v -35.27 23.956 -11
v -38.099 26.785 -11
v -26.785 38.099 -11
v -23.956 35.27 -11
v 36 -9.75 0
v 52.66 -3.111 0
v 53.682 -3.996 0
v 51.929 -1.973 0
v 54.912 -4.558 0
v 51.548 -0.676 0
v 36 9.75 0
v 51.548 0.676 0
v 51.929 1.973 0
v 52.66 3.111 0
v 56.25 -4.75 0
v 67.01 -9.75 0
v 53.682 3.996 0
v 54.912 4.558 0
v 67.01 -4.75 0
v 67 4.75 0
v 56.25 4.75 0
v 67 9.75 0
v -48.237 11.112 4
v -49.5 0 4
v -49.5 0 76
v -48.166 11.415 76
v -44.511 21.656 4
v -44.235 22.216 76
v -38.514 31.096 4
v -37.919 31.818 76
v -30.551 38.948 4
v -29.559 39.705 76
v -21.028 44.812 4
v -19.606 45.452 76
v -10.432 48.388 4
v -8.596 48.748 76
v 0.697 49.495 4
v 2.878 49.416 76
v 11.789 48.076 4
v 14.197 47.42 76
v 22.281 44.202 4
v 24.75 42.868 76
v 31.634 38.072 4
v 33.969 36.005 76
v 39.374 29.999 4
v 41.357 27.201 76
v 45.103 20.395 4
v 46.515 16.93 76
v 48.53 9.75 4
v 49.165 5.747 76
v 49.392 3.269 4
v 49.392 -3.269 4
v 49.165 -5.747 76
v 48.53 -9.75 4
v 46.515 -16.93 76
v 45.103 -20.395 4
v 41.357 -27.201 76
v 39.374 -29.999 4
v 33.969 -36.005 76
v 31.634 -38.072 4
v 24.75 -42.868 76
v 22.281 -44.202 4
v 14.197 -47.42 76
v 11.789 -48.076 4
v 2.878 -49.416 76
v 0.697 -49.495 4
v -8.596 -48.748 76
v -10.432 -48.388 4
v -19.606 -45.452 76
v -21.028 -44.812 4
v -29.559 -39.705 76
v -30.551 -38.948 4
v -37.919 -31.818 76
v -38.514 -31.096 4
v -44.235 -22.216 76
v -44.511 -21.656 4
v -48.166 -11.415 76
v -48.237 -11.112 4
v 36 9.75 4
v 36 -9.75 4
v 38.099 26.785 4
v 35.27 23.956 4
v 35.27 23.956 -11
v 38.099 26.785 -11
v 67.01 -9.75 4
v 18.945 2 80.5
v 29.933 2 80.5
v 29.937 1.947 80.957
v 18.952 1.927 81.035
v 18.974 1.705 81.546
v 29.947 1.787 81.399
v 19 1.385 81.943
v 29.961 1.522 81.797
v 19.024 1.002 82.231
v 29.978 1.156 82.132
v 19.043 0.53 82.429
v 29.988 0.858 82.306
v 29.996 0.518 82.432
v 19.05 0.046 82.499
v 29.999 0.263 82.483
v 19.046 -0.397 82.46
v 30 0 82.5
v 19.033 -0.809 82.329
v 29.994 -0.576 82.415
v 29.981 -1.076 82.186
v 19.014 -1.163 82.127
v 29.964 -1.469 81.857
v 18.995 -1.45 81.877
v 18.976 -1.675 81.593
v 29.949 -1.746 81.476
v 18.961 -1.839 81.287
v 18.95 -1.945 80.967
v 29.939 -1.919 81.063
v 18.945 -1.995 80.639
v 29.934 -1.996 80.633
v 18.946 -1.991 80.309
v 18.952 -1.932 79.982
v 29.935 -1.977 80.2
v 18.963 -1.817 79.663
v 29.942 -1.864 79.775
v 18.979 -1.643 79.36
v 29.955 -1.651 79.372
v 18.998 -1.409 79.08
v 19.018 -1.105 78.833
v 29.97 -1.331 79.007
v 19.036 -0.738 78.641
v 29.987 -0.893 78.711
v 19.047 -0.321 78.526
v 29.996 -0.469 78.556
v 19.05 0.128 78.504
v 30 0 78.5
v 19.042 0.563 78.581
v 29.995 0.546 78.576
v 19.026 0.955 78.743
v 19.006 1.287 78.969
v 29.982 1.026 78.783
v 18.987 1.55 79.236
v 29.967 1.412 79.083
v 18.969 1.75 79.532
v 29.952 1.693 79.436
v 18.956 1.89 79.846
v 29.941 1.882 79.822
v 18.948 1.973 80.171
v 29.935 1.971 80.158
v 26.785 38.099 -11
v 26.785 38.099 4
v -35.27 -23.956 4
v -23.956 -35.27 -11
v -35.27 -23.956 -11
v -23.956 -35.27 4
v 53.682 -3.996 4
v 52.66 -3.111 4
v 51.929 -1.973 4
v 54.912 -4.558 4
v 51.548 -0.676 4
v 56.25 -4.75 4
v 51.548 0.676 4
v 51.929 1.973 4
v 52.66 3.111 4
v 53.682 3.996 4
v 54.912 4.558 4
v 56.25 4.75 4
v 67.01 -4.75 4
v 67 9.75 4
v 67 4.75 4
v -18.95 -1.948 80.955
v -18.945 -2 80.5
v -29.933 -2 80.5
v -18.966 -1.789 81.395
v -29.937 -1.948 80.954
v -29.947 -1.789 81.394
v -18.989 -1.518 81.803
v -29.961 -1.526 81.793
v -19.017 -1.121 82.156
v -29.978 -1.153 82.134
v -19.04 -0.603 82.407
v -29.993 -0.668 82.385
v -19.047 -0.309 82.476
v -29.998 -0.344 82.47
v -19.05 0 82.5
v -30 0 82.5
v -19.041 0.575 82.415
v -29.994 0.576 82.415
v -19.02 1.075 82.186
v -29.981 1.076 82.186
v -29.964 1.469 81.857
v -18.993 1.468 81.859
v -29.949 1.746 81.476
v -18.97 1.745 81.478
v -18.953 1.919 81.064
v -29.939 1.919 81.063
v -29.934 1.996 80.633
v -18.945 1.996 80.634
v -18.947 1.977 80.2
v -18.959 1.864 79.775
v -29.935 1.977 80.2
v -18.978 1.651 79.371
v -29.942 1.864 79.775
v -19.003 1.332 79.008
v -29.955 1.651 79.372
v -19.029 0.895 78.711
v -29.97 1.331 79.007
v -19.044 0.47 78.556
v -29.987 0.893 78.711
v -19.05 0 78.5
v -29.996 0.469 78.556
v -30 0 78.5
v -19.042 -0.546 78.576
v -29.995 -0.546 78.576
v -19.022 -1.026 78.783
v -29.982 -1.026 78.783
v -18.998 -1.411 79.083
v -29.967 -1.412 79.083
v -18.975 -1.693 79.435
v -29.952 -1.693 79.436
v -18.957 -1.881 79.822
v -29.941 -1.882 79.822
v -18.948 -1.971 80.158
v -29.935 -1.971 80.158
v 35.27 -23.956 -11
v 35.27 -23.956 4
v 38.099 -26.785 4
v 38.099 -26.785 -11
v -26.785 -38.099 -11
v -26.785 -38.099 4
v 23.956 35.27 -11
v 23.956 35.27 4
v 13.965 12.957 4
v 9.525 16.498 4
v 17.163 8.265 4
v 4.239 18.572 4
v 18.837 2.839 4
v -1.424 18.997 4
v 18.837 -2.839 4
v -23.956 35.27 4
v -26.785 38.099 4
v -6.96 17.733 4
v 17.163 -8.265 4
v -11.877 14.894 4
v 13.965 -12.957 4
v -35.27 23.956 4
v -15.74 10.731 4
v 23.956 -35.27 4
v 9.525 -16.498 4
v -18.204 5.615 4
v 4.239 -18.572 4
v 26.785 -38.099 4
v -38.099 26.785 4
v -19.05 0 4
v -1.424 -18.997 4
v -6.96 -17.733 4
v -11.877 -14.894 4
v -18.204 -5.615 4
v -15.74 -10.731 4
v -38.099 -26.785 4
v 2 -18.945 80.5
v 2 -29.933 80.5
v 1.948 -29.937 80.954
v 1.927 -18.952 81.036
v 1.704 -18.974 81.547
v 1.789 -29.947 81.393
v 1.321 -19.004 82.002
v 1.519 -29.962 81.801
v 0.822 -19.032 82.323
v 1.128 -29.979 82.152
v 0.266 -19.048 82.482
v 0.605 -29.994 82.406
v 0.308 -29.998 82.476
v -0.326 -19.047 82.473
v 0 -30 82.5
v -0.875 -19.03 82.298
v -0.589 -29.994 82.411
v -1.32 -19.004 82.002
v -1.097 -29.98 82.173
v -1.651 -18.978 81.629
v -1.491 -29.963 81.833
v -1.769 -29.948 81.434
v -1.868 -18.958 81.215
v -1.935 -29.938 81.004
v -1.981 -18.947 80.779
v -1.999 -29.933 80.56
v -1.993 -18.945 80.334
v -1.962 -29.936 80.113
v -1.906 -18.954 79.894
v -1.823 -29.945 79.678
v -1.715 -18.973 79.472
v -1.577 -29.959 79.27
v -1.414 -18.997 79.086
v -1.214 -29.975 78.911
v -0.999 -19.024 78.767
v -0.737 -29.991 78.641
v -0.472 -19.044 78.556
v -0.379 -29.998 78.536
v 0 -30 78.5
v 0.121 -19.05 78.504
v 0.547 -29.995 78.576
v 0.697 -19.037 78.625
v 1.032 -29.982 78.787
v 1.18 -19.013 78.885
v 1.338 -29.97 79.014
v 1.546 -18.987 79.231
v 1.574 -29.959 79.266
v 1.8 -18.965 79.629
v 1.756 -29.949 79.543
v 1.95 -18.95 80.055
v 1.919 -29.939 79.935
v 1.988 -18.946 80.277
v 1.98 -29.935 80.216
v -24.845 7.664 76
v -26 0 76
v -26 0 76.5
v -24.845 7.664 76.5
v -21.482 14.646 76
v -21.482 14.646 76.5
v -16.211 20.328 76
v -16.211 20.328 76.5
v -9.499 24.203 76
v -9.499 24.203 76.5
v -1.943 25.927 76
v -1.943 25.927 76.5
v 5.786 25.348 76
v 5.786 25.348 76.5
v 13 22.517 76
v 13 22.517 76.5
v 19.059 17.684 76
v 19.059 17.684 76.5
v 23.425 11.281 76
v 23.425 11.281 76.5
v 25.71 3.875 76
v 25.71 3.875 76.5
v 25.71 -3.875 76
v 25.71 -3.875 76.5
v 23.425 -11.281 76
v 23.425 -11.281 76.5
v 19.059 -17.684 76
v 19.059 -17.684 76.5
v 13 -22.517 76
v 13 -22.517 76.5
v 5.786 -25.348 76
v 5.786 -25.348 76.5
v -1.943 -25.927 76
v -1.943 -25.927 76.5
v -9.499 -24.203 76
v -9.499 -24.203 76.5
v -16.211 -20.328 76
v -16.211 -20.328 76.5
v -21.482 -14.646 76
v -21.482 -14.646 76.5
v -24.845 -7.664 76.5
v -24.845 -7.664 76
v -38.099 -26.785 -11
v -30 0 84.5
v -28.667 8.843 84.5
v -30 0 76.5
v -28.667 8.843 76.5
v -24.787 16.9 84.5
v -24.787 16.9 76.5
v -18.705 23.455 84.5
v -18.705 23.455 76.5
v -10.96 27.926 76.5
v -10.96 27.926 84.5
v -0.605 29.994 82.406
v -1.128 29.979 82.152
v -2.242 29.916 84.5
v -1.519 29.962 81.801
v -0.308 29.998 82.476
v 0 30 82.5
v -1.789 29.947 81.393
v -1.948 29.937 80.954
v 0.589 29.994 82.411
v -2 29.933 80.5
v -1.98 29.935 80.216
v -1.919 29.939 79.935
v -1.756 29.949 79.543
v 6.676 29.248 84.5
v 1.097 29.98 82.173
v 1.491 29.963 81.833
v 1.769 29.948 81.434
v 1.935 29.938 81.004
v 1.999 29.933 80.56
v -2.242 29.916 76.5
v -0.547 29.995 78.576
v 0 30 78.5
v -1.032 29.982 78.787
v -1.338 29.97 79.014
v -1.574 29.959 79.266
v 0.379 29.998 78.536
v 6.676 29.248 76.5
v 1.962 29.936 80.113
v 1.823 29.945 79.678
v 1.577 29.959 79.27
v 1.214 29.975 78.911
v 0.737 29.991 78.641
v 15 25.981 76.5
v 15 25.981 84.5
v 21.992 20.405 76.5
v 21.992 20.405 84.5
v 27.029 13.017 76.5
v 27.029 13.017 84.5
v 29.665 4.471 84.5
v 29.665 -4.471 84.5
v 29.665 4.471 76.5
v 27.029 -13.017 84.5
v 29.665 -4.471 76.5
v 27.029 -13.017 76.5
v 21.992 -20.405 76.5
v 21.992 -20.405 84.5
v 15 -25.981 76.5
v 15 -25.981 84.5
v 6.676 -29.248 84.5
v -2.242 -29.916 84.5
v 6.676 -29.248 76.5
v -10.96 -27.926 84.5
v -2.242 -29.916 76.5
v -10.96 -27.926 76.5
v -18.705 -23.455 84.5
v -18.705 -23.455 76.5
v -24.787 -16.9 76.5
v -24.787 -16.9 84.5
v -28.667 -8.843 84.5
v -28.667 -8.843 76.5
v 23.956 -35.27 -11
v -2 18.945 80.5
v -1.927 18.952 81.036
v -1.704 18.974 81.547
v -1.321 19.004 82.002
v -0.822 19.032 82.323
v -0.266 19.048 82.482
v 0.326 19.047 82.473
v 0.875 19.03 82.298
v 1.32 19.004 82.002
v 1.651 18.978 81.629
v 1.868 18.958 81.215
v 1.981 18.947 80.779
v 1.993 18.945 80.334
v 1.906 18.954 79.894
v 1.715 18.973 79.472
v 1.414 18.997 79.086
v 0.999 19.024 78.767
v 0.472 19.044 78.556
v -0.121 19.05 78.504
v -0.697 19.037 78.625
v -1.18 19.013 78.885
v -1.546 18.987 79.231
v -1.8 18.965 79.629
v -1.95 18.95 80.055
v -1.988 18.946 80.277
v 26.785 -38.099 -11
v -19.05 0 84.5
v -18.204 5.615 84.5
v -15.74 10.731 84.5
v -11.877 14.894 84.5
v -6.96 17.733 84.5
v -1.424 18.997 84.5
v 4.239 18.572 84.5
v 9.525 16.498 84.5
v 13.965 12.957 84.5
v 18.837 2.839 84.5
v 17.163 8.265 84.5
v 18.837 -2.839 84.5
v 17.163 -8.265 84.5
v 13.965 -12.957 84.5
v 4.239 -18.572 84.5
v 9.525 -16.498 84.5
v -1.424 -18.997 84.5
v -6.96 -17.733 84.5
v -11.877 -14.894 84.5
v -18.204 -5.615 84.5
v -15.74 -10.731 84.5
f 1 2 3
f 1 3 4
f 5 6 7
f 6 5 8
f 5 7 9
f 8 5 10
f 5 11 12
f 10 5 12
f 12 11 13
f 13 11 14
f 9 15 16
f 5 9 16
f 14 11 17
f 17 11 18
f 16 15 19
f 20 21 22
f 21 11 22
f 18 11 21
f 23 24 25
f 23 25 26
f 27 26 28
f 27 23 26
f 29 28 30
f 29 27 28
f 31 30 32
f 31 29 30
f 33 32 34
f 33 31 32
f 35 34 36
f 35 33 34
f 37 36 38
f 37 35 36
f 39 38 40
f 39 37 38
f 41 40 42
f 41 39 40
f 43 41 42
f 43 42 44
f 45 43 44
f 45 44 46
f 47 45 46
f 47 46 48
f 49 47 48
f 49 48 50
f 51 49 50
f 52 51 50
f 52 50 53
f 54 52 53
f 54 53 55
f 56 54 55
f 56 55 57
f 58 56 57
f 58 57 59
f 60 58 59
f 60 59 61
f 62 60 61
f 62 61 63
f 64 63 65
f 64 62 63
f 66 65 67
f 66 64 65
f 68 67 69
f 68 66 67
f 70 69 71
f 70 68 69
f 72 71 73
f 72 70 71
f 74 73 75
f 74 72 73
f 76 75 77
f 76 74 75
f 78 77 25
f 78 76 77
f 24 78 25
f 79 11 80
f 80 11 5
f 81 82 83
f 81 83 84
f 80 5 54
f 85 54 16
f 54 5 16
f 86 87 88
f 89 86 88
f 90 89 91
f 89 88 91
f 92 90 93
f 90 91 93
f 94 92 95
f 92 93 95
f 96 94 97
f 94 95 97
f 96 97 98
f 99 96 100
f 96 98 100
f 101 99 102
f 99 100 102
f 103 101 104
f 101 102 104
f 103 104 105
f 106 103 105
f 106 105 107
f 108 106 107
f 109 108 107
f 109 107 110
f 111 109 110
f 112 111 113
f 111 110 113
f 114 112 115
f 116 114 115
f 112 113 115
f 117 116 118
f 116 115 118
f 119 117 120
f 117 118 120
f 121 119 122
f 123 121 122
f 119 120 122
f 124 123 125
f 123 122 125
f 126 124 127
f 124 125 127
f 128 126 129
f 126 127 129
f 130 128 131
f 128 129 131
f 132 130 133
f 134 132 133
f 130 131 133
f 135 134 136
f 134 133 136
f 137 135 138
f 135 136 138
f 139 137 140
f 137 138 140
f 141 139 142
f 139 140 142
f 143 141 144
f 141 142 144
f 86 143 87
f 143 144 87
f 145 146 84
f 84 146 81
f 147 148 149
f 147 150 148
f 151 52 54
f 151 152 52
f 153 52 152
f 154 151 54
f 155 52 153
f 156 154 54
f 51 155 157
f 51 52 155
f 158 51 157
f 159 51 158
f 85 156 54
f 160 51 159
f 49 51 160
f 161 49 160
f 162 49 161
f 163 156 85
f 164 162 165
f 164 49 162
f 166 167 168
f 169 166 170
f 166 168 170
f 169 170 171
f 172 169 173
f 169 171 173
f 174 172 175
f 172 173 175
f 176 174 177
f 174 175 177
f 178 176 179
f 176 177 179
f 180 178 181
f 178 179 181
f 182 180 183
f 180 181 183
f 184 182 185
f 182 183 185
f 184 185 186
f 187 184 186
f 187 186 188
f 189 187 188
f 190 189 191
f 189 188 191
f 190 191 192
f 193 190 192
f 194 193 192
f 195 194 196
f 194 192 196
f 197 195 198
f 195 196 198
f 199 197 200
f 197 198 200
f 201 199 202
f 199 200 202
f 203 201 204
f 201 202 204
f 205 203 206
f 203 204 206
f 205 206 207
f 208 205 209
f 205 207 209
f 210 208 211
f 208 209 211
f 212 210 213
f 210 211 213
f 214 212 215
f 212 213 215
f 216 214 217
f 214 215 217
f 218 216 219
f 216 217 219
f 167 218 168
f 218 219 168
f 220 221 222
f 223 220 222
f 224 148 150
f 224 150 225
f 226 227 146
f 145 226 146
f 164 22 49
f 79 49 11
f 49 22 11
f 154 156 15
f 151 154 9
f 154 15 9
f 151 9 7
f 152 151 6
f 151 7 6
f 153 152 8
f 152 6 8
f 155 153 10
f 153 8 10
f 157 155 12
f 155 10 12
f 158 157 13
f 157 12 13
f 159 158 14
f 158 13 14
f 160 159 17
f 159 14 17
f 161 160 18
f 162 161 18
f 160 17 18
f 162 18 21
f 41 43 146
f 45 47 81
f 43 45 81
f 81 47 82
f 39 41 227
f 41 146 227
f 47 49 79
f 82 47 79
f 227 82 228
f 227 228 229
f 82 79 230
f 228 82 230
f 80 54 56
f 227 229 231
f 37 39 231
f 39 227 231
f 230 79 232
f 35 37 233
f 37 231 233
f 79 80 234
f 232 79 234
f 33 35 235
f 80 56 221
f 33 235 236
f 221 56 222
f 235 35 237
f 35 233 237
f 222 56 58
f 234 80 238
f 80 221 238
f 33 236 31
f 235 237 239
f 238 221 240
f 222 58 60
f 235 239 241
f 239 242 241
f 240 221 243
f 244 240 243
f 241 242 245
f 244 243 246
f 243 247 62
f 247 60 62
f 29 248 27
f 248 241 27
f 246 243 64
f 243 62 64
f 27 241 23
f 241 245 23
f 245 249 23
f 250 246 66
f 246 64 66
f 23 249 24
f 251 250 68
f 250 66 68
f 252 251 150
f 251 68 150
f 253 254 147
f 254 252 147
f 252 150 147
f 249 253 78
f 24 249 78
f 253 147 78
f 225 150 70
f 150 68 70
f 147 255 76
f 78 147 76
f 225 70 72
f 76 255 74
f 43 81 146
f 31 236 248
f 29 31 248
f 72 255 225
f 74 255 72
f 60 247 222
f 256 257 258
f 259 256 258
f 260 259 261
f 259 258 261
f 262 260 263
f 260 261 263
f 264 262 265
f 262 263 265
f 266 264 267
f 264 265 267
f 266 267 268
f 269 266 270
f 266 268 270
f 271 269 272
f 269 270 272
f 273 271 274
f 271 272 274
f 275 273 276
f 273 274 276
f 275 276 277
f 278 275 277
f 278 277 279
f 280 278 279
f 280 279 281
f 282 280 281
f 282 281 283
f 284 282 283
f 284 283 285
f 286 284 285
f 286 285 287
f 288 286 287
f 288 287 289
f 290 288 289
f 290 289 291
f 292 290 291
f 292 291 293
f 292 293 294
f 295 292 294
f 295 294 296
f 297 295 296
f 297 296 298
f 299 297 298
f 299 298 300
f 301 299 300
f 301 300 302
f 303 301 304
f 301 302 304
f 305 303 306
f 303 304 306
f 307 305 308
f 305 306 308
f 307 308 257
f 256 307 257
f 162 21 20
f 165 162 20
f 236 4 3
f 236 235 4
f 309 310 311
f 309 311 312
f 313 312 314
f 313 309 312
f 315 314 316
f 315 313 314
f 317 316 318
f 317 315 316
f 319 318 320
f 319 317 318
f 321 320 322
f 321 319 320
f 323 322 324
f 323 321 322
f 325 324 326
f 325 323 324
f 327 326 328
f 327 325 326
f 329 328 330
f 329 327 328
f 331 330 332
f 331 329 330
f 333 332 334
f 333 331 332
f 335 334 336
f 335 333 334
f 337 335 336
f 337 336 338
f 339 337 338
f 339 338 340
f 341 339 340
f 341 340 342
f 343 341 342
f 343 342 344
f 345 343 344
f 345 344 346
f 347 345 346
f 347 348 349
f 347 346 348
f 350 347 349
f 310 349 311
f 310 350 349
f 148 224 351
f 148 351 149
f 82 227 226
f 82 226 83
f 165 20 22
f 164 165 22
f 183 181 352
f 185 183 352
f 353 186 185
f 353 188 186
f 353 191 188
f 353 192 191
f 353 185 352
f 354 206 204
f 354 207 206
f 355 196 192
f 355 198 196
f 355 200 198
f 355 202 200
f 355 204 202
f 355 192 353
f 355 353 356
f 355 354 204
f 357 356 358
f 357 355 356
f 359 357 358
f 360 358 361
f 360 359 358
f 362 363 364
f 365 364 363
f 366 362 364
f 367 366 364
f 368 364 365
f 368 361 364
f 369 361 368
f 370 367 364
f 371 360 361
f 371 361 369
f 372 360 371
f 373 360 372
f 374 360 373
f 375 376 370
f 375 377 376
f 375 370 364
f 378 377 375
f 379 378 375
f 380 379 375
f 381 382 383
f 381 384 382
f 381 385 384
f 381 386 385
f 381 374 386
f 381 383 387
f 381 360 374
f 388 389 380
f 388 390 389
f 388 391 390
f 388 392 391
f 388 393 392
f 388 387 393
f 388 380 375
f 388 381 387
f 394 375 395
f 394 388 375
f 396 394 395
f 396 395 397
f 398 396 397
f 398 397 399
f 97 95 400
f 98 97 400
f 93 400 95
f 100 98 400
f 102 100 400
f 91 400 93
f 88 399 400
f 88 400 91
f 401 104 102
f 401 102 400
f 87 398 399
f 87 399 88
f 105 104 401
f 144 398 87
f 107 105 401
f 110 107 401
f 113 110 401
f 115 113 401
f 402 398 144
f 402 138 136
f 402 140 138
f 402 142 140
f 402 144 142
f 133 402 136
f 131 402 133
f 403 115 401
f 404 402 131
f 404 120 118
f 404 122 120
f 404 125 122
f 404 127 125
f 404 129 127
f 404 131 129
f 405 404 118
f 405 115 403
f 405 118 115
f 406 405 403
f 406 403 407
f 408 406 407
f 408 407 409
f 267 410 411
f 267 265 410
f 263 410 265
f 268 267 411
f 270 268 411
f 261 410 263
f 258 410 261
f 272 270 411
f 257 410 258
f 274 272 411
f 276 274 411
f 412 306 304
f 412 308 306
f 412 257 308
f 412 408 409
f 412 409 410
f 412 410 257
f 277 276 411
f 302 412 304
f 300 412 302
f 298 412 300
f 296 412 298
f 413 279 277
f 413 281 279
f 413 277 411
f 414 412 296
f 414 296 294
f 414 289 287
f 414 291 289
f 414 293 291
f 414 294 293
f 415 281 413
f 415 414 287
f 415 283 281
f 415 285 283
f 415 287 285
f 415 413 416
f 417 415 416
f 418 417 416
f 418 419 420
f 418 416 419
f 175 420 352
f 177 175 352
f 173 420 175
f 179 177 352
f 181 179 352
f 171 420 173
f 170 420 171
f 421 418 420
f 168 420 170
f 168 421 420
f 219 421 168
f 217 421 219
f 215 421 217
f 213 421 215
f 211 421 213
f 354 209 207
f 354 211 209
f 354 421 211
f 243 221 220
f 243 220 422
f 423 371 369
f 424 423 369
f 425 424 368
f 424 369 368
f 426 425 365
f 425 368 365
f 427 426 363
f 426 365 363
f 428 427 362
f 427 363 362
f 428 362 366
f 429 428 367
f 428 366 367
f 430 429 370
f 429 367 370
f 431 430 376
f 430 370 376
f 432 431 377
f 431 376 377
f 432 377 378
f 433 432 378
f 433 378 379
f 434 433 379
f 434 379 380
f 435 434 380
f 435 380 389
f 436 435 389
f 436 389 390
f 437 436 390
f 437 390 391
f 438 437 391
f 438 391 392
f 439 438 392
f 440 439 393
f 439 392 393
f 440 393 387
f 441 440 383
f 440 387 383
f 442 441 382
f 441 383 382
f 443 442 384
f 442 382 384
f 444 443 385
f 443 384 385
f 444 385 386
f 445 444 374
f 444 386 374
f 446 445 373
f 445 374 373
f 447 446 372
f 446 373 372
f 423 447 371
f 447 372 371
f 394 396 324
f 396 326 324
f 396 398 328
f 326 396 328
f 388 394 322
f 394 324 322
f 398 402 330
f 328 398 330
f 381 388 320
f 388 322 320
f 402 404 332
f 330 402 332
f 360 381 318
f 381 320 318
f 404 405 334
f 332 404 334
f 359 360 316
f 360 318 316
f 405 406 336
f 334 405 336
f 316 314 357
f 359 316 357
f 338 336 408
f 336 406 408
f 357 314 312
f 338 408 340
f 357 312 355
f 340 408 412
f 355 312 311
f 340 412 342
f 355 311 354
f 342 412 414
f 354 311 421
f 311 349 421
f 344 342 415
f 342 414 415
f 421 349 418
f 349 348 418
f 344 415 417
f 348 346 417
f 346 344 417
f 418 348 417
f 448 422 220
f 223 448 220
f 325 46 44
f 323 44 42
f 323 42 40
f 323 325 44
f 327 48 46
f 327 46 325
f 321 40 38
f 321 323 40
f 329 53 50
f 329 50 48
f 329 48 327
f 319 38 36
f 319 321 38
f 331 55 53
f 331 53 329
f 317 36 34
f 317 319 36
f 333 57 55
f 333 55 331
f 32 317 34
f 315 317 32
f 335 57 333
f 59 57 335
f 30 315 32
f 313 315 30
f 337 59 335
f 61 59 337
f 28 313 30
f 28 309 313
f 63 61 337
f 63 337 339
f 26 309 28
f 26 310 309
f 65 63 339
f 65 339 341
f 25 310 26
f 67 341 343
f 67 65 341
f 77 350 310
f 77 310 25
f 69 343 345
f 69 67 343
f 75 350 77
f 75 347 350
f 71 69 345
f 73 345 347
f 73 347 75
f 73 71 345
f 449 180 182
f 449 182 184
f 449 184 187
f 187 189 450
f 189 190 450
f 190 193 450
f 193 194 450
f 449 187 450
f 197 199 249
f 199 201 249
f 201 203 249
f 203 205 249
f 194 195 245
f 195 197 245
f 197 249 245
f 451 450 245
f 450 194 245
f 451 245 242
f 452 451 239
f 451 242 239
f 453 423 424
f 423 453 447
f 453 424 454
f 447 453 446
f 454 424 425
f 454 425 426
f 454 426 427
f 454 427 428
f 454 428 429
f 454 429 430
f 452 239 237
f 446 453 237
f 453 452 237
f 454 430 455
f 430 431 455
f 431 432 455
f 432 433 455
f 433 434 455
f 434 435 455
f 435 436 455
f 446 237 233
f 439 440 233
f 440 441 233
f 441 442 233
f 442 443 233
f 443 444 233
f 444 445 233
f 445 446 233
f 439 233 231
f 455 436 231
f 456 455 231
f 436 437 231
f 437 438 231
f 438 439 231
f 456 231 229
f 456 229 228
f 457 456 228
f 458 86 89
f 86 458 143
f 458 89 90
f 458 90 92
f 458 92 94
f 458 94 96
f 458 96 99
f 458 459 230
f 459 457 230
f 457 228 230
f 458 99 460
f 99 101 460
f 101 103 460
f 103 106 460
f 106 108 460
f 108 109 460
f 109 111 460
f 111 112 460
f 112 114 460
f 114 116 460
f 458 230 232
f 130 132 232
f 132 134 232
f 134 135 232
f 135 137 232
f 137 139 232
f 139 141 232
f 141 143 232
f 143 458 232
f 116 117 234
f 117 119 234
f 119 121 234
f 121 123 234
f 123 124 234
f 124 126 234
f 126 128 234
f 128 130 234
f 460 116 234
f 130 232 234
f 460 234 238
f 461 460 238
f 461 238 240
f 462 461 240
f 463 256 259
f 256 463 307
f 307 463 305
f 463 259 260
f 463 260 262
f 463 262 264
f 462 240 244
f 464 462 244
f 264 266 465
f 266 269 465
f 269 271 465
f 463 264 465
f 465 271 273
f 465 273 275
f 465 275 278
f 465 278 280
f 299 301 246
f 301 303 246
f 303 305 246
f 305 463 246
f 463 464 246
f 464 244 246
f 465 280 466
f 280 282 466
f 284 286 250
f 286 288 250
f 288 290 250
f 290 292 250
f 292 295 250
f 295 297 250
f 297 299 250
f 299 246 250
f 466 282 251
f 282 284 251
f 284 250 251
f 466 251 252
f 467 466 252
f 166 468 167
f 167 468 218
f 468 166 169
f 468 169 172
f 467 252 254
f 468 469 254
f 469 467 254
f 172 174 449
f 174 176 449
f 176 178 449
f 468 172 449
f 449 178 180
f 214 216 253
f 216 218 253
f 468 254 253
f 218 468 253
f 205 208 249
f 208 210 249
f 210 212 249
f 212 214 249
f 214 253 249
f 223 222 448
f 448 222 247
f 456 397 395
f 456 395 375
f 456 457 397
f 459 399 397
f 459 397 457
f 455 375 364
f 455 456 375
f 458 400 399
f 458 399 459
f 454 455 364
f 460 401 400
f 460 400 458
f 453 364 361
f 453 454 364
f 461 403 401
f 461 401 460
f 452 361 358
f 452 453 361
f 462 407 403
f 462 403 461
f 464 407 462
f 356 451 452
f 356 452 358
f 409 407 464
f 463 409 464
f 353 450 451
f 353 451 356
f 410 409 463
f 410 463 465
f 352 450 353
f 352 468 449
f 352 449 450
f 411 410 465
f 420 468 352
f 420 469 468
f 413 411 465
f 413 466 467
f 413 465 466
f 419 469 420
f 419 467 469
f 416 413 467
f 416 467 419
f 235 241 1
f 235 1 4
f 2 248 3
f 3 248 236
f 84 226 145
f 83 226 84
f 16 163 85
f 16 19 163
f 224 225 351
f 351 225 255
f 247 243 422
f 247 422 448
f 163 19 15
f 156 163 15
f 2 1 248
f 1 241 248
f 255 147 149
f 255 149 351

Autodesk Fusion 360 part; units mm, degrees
sketch "Sketch1" plane through (0, 0, 0) normal (0, 0, 1) x (1, 0, 0)
  line L0 (36.0002, -9.75) -> (67.0101, -9.75)
  line L1 (67.0002, 9.75) -> (36.0002, 9.75)
  line L2 (67.0101, -4.75) -> (56.25, -4.75)
  arc A0 (56.25, 4.75) -> (51.5, 0) centre (56.25, 0) ccw
  line L3 (67.0101, -4.75) -> (67.0101, -9.75)
  line L4 (36.0002, 9.75) -> (36.0002, -9.75)
  arc A1 (51.5, 0) -> (56.25, -4.75) centre (56.25, 0) ccw
  line L5 (56.25, 4.75) -> (67.0002, 4.75)
  line L6 (67.0002, 4.75) -> (67.0002, 9.75)
  line L7 (0, 0) -> (36.0002, 0)
  point P0 (51.5001, 4.75)
  dimension "d7" = 4.75
  dimension "d8" = 4.75
  dimension "d9" = 4.75
  dimension "d10" = 31
  dimension "d11" = 19.5
extrude "Extrude1" add sketch "Sketch1" along normal blind 4
sketch "Sketch2" plane through (0, 0, 4) normal (0, 0, 1) x (-1, 0, 0)
  line L0 (-56.25, -4.75) -> (-67.0002, -4.75)
  line L1 (-67.0002, -4.75) -> (-67.0002, -9.75)
  line L2 (-67.0101, 9.75) -> (-67.0101, 4.75)
  line L3 (-67.0101, 4.75) -> (-56.25, 4.75)
  arc A0 (-51.5, 0) -> (-56.25, 4.75) centre (-56.25, 0) ccw
  arc A1 (-56.25, -4.75) -> (-51.5, 0) centre (-56.25, 0) ccw
  circle A2 centre (0, 0) radius 49.5
  circle A3 centre (0, 0) radius 19.05
  dimension "d14" = 99
  dimension "d15" = 38.1
extrude "Extrude2" add sketch "Sketch2" along normal blind 72
sketch "Sketch3" plane through (0, 0, 76) normal (0, 0, 1) x (-1, 0, 0)
  circle A0 centre (0, 0) radius 19.05
  circle A1 centre (0, 0) radius 49.5
  circle A2 centre (0, 0) radius 19.05
  circle A3 centre (0, 0) radius 26
extrude "Extrude3" add sketch "Sketch3" along normal blind 0.5 contours A3
sketch "Sketch4" plane through (0, 0, 4) normal (0, 0, -1) x (1, 0, 0)
  line L0 (36.0002, 9.75) -> (48.5303, 9.75)
  arc A0 (48.5303, 9.75) -> (48.5303, -9.75) centre (0, 0) ccw
  line L1 (48.5303, -9.75) -> (36.0002, -9.75)
  line L2 (36.0002, -9.75) -> (36.0002, 9.75)
  circle A1 centre (0, 0) radius 19.05
  line L3 (0, 0) -> (39.0512, 0) construction
  line L4 (29.6134, 29.6134) -> (23.9565, 35.2703)
  line L5 (29.6134, 29.6134) -> (35.2703, 23.9565)
  line L6 (23.9565, 35.2703) -> (26.785, 38.0987)
  line L7 (35.2703, 23.9565) -> (38.0987, 26.785)
  line L8 (38.0987, 26.785) -> (26.785, 38.0987)
  line L9 (-29.6134, 29.6134) -> (-35.2703, 23.9565)
  line L10 (-35.2703, 23.9565) -> (-38.0987, 26.785)
  line L11 (-26.785, 38.0987) -> (-38.0987, 26.785)
  line L12 (-23.9565, 35.2703) -> (-26.785, 38.0987)
  line L13 (-29.6134, 29.6134) -> (-23.9565, 35.2703)
  line L14 (-29.6134, -29.6134) -> (-23.9565, -35.2703)
  line L15 (-23.9565, -35.2703) -> (-26.785, -38.0987)
  line L16 (-38.0987, -26.785) -> (-26.785, -38.0987)
  line L17 (-35.2703, -23.9565) -> (-38.0987, -26.785)
  line L18 (-29.6134, -29.6134) -> (-35.2703, -23.9565)
  line L19 (29.6134, -29.6134) -> (35.2703, -23.9565)
  line L20 (35.2703, -23.9565) -> (38.0987, -26.785)
  line L21 (26.785, -38.0987) -> (38.0987, -26.785)
  line L22 (23.9565, -35.2703) -> (26.785, -38.0987)
  line L23 (29.6134, -29.6134) -> (23.9565, -35.2703)
  dimension "d24" = 8
  dimension "d25" = 8
  dimension "d28" = 360
extrude "Extrude4" add sketch "Sketch4" along normal blind 15 contours L4 L5 L6 L7 L8 | L9 L10 L11 L12 L13 | L14 L15 L16 L17 L18 | L19 L20 L21 L22 L23
sketch "Sketch5" plane through (0, 0, 76.5) normal (0, 0, 1) x (-1, 0, 0)
  circle A0 centre (0, 0) radius 19.05
  circle A1 centre (0, 0) radius 30
  circle A2 centre (0, 0) radius 19.05
  dimension "d31" = 60
extrude "Extrude5" add sketch "Sketch5" along normal blind 8
ref_plane "WorkPlane1" through (30, 0, 80.0207) normal (1, 0, 0) x (0, -1, 0)
sketch "Sketch6" plane through (30, 0, 0) normal (1, 0, 0) x (0, 1, 0)
  circle A0 centre (0, 80.5) radius 2
  dimension "d35" = 4
extrude "Extrude6" cut sketch "Sketch6" against normal blind 15.5
pattern_circular "C-Pattern1" count 4 over 360 about axis through (0, 0, 4) along (0, 0, 1) of "Extrude6"
equation "rotary_connect_length = 72 mm"
equation "d17 = rotary_connect_length"
equation "rotary_connect_space = 0.5 mm"
equation "rotary_connect_rotor_size = 8.5 mm"
equation "d21 = rotary_connect_space"
equation "d32 = rotary_connect_rotor_size - rotary_connect_space"
